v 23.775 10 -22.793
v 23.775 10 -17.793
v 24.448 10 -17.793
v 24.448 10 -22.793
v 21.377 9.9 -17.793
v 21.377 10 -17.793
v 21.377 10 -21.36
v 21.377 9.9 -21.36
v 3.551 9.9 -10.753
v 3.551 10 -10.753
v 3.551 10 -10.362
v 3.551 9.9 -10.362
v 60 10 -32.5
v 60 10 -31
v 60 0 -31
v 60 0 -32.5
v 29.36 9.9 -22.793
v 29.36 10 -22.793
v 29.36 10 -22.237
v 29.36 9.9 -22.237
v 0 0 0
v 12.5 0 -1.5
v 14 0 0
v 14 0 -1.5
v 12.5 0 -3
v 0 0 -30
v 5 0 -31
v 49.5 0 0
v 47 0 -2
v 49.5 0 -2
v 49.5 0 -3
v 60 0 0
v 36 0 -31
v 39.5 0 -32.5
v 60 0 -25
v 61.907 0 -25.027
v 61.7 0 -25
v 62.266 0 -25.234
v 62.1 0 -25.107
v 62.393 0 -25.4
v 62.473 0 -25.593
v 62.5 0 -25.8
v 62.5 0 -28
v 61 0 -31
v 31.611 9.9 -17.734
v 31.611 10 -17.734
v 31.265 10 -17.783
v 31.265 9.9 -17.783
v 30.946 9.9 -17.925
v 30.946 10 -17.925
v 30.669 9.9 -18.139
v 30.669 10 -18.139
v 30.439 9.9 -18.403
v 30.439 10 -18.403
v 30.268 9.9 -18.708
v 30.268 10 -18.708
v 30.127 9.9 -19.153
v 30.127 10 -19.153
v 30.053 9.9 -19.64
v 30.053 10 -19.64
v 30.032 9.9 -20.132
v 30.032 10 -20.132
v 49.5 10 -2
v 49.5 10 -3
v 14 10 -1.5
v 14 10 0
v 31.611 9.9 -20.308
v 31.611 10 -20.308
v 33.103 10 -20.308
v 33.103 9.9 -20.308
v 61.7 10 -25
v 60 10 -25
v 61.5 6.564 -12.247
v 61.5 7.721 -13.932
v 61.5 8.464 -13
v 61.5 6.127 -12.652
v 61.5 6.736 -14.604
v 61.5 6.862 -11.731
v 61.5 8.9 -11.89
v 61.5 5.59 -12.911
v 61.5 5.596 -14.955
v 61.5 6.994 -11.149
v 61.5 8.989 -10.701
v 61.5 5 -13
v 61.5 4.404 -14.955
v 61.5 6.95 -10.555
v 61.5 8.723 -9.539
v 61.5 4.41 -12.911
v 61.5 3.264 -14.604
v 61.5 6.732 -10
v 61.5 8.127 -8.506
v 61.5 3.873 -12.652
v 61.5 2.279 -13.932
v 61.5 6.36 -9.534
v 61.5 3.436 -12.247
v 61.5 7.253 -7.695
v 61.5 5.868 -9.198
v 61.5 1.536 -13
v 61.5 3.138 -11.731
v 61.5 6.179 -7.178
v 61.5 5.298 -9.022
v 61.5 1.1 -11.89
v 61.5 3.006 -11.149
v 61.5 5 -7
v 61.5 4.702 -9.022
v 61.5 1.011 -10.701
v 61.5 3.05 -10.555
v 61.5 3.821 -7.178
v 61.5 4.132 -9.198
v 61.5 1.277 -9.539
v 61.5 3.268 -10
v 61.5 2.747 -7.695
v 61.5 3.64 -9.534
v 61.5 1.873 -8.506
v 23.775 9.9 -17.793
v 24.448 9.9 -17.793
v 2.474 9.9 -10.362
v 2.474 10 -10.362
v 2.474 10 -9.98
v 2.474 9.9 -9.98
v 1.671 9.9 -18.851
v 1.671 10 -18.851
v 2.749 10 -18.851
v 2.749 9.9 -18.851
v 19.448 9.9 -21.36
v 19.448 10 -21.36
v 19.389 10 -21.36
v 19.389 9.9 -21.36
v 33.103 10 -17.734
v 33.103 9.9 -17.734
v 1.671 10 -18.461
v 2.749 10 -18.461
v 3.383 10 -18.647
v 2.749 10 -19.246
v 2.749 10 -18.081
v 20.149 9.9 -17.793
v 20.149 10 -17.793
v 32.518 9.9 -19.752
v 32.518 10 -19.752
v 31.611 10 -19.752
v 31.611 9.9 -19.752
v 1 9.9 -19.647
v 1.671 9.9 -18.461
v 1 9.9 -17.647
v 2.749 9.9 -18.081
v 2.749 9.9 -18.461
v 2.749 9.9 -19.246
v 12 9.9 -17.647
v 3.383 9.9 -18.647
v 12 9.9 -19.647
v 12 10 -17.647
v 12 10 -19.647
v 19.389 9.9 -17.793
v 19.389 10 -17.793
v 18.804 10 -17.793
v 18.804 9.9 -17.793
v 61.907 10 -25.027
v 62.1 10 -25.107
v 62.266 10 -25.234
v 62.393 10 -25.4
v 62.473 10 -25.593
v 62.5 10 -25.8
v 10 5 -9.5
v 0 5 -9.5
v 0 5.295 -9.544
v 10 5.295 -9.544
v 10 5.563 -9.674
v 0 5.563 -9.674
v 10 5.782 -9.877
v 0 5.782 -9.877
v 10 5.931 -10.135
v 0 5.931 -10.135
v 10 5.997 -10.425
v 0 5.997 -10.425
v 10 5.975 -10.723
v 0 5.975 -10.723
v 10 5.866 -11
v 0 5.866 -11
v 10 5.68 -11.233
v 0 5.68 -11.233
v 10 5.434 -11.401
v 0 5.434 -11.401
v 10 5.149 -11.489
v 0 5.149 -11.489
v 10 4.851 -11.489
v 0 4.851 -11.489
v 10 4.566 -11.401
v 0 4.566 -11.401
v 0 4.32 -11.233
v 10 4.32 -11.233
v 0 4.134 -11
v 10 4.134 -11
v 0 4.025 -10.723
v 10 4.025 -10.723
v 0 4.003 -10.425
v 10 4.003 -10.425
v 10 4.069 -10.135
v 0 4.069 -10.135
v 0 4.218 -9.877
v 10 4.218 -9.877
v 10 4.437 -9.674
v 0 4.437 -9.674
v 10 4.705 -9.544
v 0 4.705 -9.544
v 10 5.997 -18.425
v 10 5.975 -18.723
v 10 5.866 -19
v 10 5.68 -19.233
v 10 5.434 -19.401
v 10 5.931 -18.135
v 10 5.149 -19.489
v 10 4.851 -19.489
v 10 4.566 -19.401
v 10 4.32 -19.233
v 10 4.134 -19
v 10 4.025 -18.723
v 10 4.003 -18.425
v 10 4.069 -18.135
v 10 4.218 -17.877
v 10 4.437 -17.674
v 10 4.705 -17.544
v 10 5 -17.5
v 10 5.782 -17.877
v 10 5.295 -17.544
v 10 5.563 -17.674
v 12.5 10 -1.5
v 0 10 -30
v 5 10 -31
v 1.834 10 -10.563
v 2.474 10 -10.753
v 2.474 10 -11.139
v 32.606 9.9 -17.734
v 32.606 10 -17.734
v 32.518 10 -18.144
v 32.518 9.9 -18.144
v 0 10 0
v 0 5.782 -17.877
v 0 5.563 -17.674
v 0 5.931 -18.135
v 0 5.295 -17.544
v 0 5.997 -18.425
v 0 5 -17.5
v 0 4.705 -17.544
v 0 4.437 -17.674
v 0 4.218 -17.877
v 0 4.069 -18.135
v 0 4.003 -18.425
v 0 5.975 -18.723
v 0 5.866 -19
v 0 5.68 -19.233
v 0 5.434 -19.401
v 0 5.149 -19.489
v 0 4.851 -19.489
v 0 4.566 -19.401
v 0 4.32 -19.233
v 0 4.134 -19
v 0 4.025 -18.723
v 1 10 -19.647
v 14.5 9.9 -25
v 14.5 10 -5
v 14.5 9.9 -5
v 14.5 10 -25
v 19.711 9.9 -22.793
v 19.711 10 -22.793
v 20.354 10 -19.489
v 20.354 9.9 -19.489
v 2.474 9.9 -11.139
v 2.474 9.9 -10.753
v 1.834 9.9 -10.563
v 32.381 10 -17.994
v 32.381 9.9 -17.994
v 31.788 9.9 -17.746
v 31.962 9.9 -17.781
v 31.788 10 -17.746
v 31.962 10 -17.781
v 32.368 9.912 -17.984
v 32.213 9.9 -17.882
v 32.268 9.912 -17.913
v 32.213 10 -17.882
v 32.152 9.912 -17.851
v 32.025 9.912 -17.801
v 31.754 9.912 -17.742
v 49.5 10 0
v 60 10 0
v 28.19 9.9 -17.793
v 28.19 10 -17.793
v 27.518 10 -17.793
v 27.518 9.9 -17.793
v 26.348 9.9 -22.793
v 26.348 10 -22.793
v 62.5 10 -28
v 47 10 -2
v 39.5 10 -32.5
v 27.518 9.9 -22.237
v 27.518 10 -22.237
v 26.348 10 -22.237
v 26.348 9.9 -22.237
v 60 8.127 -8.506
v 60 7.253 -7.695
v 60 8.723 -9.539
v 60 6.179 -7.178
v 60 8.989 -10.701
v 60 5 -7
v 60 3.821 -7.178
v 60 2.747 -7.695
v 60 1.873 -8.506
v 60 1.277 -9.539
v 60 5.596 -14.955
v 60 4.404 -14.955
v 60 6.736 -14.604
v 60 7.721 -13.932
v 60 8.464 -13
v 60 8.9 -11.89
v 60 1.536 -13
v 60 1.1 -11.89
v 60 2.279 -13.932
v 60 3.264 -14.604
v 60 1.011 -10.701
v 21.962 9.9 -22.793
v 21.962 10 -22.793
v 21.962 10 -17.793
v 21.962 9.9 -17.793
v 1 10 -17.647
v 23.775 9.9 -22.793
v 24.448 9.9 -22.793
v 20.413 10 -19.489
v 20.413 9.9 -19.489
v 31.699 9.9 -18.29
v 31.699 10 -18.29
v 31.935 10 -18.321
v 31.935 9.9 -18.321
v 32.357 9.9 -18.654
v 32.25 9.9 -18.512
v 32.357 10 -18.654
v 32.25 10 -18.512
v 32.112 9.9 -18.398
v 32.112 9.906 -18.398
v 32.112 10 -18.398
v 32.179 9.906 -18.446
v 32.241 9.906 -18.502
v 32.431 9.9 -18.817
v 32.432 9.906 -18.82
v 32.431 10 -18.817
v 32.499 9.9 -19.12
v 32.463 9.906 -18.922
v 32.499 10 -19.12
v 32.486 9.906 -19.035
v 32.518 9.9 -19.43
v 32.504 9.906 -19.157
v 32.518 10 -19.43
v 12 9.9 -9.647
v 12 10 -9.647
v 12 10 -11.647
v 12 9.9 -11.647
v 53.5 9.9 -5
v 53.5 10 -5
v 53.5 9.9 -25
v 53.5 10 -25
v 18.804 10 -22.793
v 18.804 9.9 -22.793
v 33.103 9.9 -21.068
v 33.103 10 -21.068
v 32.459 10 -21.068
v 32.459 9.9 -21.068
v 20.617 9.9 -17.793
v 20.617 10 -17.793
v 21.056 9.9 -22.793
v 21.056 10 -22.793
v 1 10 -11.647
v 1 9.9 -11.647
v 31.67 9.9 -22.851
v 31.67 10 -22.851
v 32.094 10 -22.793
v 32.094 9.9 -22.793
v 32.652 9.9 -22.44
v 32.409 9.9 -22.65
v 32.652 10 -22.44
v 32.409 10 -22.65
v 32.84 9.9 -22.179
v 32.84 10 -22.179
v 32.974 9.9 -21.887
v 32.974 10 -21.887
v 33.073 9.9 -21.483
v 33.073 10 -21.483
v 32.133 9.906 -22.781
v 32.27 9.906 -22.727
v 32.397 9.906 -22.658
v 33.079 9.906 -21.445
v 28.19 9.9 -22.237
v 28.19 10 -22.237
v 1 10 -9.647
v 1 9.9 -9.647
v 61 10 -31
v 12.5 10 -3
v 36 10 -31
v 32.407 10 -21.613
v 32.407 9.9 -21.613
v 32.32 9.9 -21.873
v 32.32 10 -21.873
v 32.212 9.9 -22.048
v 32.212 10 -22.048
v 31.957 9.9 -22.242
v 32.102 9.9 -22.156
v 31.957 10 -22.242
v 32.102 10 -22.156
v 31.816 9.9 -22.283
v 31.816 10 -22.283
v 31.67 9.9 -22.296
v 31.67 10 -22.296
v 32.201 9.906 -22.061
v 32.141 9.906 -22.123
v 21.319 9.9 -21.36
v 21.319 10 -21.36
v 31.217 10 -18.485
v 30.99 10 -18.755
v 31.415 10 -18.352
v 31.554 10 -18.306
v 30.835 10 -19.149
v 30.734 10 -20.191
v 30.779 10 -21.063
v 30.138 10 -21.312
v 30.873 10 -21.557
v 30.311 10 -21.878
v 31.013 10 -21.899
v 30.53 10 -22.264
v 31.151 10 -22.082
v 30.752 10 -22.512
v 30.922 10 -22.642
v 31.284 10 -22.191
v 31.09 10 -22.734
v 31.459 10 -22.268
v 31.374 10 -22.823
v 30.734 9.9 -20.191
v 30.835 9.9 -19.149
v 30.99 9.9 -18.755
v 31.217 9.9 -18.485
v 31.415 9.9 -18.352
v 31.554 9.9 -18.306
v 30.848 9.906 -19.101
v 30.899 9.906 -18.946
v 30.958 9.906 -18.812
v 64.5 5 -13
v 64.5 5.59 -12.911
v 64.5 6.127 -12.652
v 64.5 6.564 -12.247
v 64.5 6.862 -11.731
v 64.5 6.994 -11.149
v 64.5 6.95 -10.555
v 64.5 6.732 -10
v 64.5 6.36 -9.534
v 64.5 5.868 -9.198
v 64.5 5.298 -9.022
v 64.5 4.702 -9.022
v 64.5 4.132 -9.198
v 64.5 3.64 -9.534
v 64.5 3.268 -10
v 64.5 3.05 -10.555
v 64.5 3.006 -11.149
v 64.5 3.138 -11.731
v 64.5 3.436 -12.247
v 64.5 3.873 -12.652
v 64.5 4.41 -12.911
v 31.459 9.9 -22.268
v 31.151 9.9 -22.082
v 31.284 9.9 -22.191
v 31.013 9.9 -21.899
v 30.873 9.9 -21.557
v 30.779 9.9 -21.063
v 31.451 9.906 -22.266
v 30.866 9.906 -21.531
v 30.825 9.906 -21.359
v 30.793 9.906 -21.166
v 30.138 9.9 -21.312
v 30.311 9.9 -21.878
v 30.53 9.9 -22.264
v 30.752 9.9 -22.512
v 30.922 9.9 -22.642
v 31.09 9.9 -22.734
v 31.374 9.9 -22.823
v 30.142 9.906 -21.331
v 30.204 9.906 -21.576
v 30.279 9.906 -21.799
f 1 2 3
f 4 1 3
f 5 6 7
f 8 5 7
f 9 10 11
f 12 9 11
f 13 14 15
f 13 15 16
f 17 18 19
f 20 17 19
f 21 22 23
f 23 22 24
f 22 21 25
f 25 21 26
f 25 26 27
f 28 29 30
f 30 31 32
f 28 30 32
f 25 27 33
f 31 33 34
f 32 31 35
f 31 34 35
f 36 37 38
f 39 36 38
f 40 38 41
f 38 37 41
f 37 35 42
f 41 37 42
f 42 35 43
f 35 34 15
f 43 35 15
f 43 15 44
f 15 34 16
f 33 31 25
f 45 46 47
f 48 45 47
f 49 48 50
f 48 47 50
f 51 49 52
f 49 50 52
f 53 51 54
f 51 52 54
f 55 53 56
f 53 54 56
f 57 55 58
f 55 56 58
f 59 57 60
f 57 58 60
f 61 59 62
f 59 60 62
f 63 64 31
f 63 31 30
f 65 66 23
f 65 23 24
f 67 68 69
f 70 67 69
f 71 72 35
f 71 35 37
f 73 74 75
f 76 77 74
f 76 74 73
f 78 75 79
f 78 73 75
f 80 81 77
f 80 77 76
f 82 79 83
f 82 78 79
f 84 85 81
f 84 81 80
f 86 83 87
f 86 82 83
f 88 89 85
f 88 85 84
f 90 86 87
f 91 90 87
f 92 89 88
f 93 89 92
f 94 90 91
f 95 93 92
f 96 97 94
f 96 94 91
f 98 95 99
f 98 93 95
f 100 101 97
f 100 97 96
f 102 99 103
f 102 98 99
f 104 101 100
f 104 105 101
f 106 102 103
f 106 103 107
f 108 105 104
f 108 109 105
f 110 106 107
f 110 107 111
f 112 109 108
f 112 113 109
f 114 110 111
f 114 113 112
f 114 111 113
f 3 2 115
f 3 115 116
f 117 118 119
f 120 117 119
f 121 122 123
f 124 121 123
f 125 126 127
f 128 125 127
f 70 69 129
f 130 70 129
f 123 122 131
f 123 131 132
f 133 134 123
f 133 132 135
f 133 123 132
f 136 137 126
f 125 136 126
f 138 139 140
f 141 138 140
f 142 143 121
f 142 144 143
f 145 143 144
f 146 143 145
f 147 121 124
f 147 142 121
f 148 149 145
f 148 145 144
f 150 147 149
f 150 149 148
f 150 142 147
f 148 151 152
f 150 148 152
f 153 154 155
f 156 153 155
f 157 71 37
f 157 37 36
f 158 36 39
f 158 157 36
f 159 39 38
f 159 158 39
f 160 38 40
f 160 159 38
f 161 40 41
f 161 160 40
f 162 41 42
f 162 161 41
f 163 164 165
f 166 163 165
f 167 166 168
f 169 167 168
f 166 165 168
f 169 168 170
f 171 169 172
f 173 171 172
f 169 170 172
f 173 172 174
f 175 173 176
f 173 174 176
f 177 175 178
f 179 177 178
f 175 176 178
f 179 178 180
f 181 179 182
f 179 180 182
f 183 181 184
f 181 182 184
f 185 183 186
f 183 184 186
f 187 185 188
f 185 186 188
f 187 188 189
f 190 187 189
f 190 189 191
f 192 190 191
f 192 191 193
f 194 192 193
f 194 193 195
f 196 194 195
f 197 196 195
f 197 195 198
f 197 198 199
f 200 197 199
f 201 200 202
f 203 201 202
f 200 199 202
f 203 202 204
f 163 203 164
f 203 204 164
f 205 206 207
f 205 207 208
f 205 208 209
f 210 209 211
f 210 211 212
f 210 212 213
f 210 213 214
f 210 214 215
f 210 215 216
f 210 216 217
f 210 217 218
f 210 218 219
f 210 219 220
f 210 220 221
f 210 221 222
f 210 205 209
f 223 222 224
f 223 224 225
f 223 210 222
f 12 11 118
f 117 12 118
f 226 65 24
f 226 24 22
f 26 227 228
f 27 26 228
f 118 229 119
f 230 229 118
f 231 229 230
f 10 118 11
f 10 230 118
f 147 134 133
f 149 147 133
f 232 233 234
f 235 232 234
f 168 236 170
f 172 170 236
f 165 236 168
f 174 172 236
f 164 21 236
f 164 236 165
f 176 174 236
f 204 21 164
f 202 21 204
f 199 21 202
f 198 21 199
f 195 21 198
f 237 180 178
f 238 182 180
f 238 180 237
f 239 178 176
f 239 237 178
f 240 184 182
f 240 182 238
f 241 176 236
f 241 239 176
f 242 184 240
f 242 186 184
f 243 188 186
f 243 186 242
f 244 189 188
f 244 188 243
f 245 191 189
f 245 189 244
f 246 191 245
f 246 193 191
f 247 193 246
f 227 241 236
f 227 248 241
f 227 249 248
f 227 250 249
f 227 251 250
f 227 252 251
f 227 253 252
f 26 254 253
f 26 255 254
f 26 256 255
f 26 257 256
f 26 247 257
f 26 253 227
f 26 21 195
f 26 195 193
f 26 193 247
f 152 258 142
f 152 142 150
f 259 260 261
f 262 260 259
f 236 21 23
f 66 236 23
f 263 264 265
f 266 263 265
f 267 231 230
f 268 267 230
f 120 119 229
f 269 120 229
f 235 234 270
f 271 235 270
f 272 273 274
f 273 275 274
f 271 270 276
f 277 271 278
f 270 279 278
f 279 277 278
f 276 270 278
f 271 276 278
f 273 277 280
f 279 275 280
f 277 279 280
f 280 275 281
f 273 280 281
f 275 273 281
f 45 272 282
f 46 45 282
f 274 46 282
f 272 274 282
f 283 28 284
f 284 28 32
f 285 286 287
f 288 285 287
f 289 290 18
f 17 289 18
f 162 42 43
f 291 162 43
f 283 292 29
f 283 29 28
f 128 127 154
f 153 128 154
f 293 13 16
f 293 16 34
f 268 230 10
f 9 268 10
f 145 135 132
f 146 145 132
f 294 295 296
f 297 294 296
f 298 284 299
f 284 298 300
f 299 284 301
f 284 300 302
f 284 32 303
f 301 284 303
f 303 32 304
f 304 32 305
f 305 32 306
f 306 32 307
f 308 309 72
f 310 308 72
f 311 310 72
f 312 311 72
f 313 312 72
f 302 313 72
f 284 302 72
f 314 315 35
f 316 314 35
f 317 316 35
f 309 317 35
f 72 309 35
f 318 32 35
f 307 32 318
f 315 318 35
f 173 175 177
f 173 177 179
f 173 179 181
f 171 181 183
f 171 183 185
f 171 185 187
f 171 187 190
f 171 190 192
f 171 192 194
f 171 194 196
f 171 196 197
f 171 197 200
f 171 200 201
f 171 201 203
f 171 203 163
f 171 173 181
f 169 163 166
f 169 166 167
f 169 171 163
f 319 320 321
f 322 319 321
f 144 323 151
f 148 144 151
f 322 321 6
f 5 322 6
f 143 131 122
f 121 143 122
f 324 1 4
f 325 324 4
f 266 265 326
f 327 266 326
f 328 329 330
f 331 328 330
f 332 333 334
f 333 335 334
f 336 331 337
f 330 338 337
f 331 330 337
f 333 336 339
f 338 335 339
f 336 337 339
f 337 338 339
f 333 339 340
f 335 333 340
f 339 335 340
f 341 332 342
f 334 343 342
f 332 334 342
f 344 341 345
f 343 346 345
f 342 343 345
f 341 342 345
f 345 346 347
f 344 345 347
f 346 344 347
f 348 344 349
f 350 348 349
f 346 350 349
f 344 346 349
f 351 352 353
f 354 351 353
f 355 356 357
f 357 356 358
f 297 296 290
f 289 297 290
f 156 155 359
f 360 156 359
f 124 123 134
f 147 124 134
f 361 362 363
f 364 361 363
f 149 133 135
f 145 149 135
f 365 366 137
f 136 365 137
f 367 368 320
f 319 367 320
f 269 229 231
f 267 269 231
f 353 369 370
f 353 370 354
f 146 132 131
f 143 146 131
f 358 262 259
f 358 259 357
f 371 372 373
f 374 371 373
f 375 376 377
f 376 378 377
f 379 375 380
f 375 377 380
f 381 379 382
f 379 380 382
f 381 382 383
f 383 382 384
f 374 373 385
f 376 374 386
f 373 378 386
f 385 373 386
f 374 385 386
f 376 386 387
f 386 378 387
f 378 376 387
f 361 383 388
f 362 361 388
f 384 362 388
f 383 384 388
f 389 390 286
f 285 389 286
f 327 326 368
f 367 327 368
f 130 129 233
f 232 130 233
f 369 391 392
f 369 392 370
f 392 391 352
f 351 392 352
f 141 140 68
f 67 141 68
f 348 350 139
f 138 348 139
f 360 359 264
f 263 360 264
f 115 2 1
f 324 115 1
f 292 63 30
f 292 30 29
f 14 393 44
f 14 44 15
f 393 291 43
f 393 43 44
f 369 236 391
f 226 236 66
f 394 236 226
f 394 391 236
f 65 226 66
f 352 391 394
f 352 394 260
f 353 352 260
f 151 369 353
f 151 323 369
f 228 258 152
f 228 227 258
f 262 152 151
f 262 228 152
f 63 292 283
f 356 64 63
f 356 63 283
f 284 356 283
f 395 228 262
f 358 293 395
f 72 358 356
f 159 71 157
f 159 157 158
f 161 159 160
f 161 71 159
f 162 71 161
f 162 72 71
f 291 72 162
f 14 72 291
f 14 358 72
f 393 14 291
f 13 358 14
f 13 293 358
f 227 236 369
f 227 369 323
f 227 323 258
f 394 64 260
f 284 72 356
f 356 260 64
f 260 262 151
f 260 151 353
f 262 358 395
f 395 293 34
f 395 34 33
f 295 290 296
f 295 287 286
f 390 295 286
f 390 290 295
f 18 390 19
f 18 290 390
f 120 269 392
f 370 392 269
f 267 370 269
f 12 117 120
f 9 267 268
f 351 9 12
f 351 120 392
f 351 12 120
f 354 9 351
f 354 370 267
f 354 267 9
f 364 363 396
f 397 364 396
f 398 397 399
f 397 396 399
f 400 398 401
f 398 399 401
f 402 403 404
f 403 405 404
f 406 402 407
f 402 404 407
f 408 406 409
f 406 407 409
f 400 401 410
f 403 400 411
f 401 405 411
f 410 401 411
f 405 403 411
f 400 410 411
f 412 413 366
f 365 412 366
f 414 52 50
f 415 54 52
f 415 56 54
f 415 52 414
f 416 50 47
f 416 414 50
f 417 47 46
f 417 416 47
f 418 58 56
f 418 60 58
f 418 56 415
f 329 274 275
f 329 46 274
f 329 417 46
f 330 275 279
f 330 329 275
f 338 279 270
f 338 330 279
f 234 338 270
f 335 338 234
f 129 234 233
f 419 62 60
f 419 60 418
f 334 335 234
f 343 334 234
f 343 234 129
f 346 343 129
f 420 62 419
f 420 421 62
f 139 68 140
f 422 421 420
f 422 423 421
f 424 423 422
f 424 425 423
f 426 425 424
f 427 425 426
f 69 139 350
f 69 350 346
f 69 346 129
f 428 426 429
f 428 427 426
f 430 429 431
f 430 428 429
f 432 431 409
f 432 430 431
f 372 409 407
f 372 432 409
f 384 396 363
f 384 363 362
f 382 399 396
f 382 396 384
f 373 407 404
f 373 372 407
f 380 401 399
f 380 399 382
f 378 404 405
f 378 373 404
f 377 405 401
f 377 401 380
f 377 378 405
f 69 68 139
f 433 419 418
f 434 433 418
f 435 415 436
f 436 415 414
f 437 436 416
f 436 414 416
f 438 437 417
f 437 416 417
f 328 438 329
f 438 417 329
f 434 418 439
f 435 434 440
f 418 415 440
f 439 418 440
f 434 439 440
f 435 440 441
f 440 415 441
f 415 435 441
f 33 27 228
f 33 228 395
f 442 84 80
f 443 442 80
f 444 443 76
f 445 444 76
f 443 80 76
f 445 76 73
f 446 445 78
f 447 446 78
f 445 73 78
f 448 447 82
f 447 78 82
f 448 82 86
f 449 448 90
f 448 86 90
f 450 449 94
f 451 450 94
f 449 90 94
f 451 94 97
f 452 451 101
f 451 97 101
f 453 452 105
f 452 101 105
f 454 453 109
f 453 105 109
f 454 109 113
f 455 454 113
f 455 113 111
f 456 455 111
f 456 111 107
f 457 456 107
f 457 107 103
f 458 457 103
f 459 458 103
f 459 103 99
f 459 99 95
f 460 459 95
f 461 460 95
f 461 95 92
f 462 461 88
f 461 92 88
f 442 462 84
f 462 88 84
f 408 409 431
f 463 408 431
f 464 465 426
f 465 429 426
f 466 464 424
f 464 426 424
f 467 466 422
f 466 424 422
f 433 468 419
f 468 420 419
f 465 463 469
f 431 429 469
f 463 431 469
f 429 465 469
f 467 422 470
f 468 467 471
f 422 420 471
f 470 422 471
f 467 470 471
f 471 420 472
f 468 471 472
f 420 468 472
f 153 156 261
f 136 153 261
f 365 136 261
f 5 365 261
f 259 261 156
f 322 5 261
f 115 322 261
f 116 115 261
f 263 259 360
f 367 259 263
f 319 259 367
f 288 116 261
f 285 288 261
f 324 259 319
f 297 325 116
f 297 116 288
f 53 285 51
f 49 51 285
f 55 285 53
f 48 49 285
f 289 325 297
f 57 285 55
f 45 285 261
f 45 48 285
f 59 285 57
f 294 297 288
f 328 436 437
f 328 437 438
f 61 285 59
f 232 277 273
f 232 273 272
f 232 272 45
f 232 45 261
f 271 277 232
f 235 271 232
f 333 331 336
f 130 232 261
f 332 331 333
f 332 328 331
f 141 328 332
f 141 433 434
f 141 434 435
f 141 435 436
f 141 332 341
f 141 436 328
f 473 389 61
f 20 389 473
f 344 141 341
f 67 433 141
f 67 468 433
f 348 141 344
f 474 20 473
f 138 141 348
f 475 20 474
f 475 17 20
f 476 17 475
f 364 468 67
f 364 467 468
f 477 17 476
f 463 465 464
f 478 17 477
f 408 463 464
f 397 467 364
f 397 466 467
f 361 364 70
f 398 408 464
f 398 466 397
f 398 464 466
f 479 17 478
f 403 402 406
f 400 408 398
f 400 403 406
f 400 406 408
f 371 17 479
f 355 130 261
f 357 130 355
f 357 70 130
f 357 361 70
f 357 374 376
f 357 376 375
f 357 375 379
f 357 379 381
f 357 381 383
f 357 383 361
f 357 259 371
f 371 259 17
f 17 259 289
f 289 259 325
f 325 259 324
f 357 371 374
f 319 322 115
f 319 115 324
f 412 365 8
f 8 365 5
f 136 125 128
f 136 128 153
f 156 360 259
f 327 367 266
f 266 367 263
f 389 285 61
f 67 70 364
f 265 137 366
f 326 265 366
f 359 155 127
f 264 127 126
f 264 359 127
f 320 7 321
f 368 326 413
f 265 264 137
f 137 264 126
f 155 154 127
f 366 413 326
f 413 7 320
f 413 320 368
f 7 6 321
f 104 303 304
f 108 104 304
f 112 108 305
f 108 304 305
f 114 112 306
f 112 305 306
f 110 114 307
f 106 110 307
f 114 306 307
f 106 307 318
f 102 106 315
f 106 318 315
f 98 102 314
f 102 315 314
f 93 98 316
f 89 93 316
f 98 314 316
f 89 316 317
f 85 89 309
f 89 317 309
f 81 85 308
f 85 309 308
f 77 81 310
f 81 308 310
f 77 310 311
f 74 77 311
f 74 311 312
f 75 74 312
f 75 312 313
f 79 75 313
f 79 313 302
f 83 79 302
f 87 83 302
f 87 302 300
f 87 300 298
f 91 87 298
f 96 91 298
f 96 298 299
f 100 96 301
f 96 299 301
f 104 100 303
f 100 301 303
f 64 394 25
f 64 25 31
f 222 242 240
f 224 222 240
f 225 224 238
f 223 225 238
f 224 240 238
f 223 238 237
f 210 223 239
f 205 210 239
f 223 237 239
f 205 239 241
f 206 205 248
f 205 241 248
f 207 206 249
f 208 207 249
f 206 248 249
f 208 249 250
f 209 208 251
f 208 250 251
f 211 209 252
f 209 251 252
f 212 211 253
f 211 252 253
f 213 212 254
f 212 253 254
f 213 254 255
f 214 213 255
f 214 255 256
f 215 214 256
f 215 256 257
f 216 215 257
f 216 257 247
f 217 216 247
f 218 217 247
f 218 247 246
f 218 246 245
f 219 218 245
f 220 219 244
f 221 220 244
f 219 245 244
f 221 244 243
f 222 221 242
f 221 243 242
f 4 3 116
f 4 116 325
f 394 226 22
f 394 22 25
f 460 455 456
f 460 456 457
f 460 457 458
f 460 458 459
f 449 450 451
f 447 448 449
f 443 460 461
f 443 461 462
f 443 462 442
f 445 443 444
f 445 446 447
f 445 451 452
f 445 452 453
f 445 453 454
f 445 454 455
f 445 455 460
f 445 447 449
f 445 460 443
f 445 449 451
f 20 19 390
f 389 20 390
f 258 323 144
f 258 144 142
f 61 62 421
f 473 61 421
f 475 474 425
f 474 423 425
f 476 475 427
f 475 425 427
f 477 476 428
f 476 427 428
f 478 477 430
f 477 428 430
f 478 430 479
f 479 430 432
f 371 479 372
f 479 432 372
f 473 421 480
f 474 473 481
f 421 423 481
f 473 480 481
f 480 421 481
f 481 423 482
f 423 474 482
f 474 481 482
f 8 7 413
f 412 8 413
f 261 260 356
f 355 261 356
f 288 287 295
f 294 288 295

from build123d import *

# Parameters (mm, degrees)
SKETCH_1_W          = 60
SKETCH_1_H          = 31
EXTRUDE_1_DEPTH     = 10
CUT_EXTRUDE_1_DEPTH = 10
EXTRUDE_2_DEPTH     = 10
SKETCH_4_R          = 1
CUT_EXTRUDE_2_DEPTH = 10
SKETCH_5_W          = 39
SKETCH_5_H          = 20
SKETCH_5_W_2        = 0.67251462
SKETCH_5_H_2        = 5
SKETCH_5_W_3        = 11
SKETCH_5_H_3        = 2
CUT_EXTRUDE_3_DEPTH = 0.1
SKETCH_6_R          = 4
EXTRUDE_3_DEPTH     = 1.5
SKETCH_7_R          = 2
EXTRUDE_4_DEPTH     = 3


with BuildPart() as part:
    # 草图1 → 凸台-拉伸1 (new body)
    with BuildSketch(Plane(origin=(0, 0, 0), x_dir=(1, 0, 0), z_dir=(0, 1, 0))):
        with Locations((30, 15.5)):
            Rectangle(SKETCH_1_W, SKETCH_1_H)
    extrude(amount=EXTRUDE_1_DEPTH)

    # 草图2 → 切除-拉伸1 (cut)
    with BuildSketch(Plane(origin=(0, 10, 0), x_dir=(1, 0, 0), z_dir=(0, 1, 0))):
        Polygon((14, 0), (14, 1.5), (12.5, 1.5), (12.5, 3), (49.5, 3), (49.5, 2), (47, 2), (49.5, 0), align=None)
        Polygon((0, 30), (5, 31), (0, 31), align=None)
    extrude(amount=-CUT_EXTRUDE_1_DEPTH, mode=Mode.SUBTRACT)

    # 草图3 → 凸台-拉伸2 (add, through all)
    with BuildSketch(Plane(origin=(0, 10, 0), x_dir=(1, 0, 0), z_dir=(0, 1, 0))):
        with BuildLine():
            Line((61, 31), (60, 31))
            Line((60, 31), (60, 25))
            Line((60, 25), (61.7, 25))
            ThreePointArc((61.7, 25), (62.265685425, 25.234314575), (62.5, 25.8))
            Line((62.5, 25.8), (62.5, 28))
            Line((62.5, 28), (61, 31))
        make_face()
        Polygon((36, 31), (60, 31), (60, 32.5), (39.5, 32.5), align=None)
    extrude(amount=-EXTRUDE_2_DEPTH)

    # 草图4 → 切除-拉伸2 (cut)
    with BuildSketch(Plane.ZY):
        with Locations((-18.5, 5)):
            Circle(SKETCH_4_R)
        with Locations((-10.5, 5)):
            Circle(SKETCH_4_R)
    extrude(amount=-CUT_EXTRUDE_2_DEPTH, mode=Mode.SUBTRACT)

    # 草图5 → 切除-拉伸3 (cut)
    # profile 1 of 3: a face of its own
    with BuildSketch(Plane(origin=(0, 10, 0), x_dir=(1, 0, 0), z_dir=(0, 1, 0))):
        with Locations((34, 15)):
            Rectangle(SKETCH_5_W, SKETCH_5_H)
        Polygon((21.962260416, 17.792968637), (21.377465095, 17.792968637), (21.377465095, 21.360220099), (21.318985562, 21.360220099), (20.617231176, 17.792968637), (20.149394919, 17.792968637), (19.447640533, 21.360220099), (19.389161001, 21.360220099), (19.389161001, 17.792968637), (18.804365679, 17.792968637), (18.804365679, 22.792968637), (19.710798428, 22.792968637), (20.354073282, 19.48887507), (20.412552814, 19.48887507), (21.055827668, 22.792968637), (21.962260416, 22.792968637), align=None, mode=Mode.SUBTRACT)
        with Locations((24.111383223, 20.292968637)):
            Rectangle(SKETCH_5_W_2, SKETCH_5_H_2, mode=Mode.SUBTRACT)
        Polygon((29.359921235, 22.237413081), (28.190330592, 22.237413081), (28.190330592, 17.792968637), (27.517815972, 17.792968637), (27.517815972, 22.237413081), (26.348225329, 22.237413081), (26.348225329, 22.792968637), (29.359921235, 22.792968637), align=None, mode=Mode.SUBTRACT)
        with BuildLine():
            Line((33.102611293, 17.734489105), (32.60553527, 17.734489105))
            Line((32.60553527, 17.734489105), (32.517815972, 18.14384583))
            add(Edge.make_bspline(
                [(32.517815972, 18.14384583), (32.496335049, 18.114894908), (32.452578683, 18.05592225), (32.366892397, 17.979393037), (32.266643174, 17.909470256), (32.151128708, 17.848642528), (32.025699097, 17.798099411), (31.892521927, 17.760859691), (31.75360842, 17.739070297), (31.659108429, 17.736026374), (31.611383223, 17.734489105)],
                knots=[0, 0, 0, 0, 0.837184115, 1.705333332, 2.658671207, 3.677307666, 4.736711015, 5.80083511, 6.889358663, 8, 8, 8, 8], degree=3))
            add(Edge.make_bspline(
                [(31.611383223, 17.734489105), (31.560714868, 17.736021013), (31.46008263, 17.739063531), (31.311817937, 17.76762581), (31.16729555, 17.811965229), (31.027834691, 17.8755244), (30.891473719, 17.955281193), (30.760771836, 18.055054478), (30.632955326, 18.171046345), (30.509527994, 18.304333327), (30.396774962, 18.45853747), (30.297519239, 18.634098702), (30.215913122, 18.832381023), (30.147881926, 19.050856514), (30.096694353, 19.291330684), (30.05919444, 19.552513083), (30.036438806, 19.835379254), (30.033799786, 20.03103084), (30.032435855, 20.132149923)],
                knots=[0, 0, 0, 0, 0.758179789, 1.505818141, 2.253143624, 3.017869083, 3.795858856, 4.614441485, 5.475677495, 6.378750386, 7.330399785, 8.330312341, 9.391702904, 10.535751225, 11.753218739, 13.069914954, 14.485637047, 16, 16, 16, 16], degree=3))
            add(Edge.make_bspline(
                [(30.032435855, 20.132149923), (30.033524015, 20.243005064), (30.035631477, 20.457700531), (30.056303392, 20.768942629), (30.090571093, 21.058155718), (30.137547246, 21.32565553), (30.198737704, 21.571304744), (30.274571201, 21.795097166), (30.362412052, 21.997908599), (30.466184437, 22.177806713), (30.5809145, 22.336396595), (30.705728208, 22.474833232), (30.84257532, 22.589830475), (30.987256047, 22.687082934), (31.14384738, 22.76138369), (31.310614479, 22.812780351), (31.487019509, 22.845452192), (31.607987718, 22.849419101), (31.669862755, 22.851448169)],
                knots=[0, 0, 0, 0, 1.495213205, 2.895810661, 4.205263949, 5.422164245, 6.557127206, 7.616570214, 8.606403325, 9.533523062, 10.412081511, 11.242765381, 12.040838916, 12.817408929, 13.588463244, 14.369296309, 15.165897781, 16, 16, 16, 16], degree=3))
            add(Edge.make_bspline(
                [(31.669862755, 22.851448169), (31.724465447, 22.850157263), (31.831330219, 22.847630786), (31.986728106, 22.823055348), (32.133156944, 22.78417248), (32.270367528, 22.72996005), (32.39858198, 22.660001985), (32.517012997, 22.573895908), (32.626334766, 22.471986726), (32.725227795, 22.355220127), (32.813311094, 22.226144327), (32.892302084, 22.088427367), (32.956880517, 21.940329471), (33.009859712, 21.783333409), (33.052602879, 21.617693101), (33.080734277, 21.442188631), (33.100302009, 21.258143875), (33.101830982, 21.132132363), (33.102611293, 21.067822438)],
                knots=[0, 0, 0, 0, 1.017118894, 1.990637724, 2.924249984, 3.836374462, 4.733711419, 5.639510097, 6.558385009, 7.513001497, 8.485403533, 9.467718841, 10.467915617, 11.491402174, 12.553806325, 13.652248568, 14.801825996, 16, 16, 16, 16], degree=3))
            Line((33.102611293, 21.067822438), (32.45933644, 21.067822438))
            add(Edge.make_bspline(
                [(32.45933644, 21.067822438), (32.458729978, 21.117290953), (32.457551218, 21.213441346), (32.448009389, 21.352666796), (32.431312149, 21.482310098), (32.410867073, 21.602817265), (32.380914637, 21.71323506), (32.347227761, 21.814971363), (32.304498884, 21.905966508), (32.256760295, 21.988236327), (32.203036922, 22.060957155), (32.142500003, 22.123391188), (32.077558088, 22.176617179), (32.007055999, 22.22128447), (31.930094878, 22.254334745), (31.84783057, 22.277999378), (31.760739913, 22.29416845), (31.700622449, 22.295309026), (31.669862755, 22.295892614)],
                knots=[0, 0, 0, 0, 1.442265648, 2.803286258, 4.065667754, 5.252751118, 6.363271917, 7.39841691, 8.373155808, 9.288343585, 10.168233039, 11.001900497, 11.817228588, 12.611567034, 13.426963055, 14.24959516, 15.104388078, 16, 16, 16, 16], degree=3))
            add(Edge.make_bspline(
                [(31.669862755, 22.295892614), (31.631828893, 22.294563094), (31.557924625, 22.291979681), (31.450633434, 22.268061012), (31.350844775, 22.23047274), (31.257857421, 22.177333742), (31.172866818, 22.108722655), (31.097286108, 22.023210173), (31.025577535, 21.925676313), (30.964584262, 21.809804655), (30.908423102, 21.678016537), (30.863297772, 21.525387026), (30.821490016, 21.353610633), (30.790614597, 21.160102718), (30.763920798, 20.947080428), (30.748343708, 20.713136474), (30.735099548, 20.458990692), (30.734500993, 20.282340978), (30.734190241, 20.190629456)],
                knots=[0, 0, 0, 0, 0.713867664, 1.387128832, 2.054865043, 2.71116651, 3.391329963, 4.097256694, 4.850367561, 5.660840087, 6.551597142, 7.538616976, 8.647598492, 9.872123473, 11.218389466, 12.680914074, 14.276824714, 16, 16, 16, 16], degree=3))
            add(Edge.make_bspline(
                [(30.734190241, 20.190629456), (30.73483395, 20.103968299), (30.736071349, 19.937379816), (30.750607233, 19.698223249), (30.772176165, 19.47971091), (30.805076542, 19.282835127), (30.843512642, 19.105844287), (30.894744195, 18.950545195), (30.953134814, 18.815066175), (31.022715541, 18.70062504), (31.098039155, 18.604304965), (31.175512101, 18.520836306), (31.255451263, 18.450044406), (31.338684162, 18.392015675), (31.424300922, 18.345320992), (31.514153456, 18.314560623), (31.605733113, 18.293658802), (31.667942985, 18.291250783), (31.699102521, 18.29004466)],
                knots=[0, 0, 0, 0, 1.763137318, 3.38927359, 4.873732177, 6.228632264, 7.449226689, 8.554896297, 9.551299921, 10.444451664, 11.27164773, 12.035603122, 12.759076972, 13.439665674, 14.096862192, 14.735741838, 15.366761318, 16, 16, 16, 16], degree=3))
            add(Edge.make_bspline(
                [(31.699102521, 18.29004466), (31.72983218, 18.290848844), (31.790132284, 18.292426876), (31.878031693, 18.305615952), (31.961197096, 18.327367151), (32.039477559, 18.357607005), (32.112590811, 18.396886673), (32.180290182, 18.444875026), (32.24233728, 18.502053953), (32.300237525, 18.567322721), (32.352177249, 18.64200929), (32.396916088, 18.726819825), (32.434506327, 18.820857568), (32.464574283, 18.924703583), (32.488267476, 19.037669605), (32.505105864, 19.159978961), (32.516471005, 19.291925027), (32.517356401, 19.383080592), (32.517815972, 19.430395538)],
                knots=[0, 0, 0, 0, 0.926763241, 1.818566216, 2.674466499, 3.515830513, 4.344194496, 5.172200422, 6.012506428, 6.88440238, 7.799833367, 8.749917039, 9.771239203, 10.849892544, 12.007626437, 13.250589984, 14.572899121, 16, 16, 16, 16], degree=3))
            Line((32.517815972, 19.430395538), (32.517815972, 19.752032964))
            Line((32.517815972, 19.752032964), (31.611383223, 19.752032964))
            Line((31.611383223, 19.752032964), (31.611383223, 20.30758852))
            Line((31.611383223, 20.30758852), (33.102611293, 20.30758852))
            Line((33.102611293, 20.30758852), (33.102611293, 17.734489105))
        make_face(mode=Mode.SUBTRACT)
    # profile 2 of 3: a face of its own
    with BuildSketch(Plane(origin=(0, 10, 0), x_dir=(1, 0, 0), z_dir=(0, 1, 0))):
        with Locations((6.5, 18.646769807)):
            Rectangle(SKETCH_5_W_3, SKETCH_5_H_3)
        Polygon((3.383335667, 18.64715665), (2.749062348, 18.08056229), (2.749062348, 18.460605674), (1.671405081, 18.460605674), (1.671405081, 18.851495045), (2.749062348, 18.851495045), (2.749062348, 19.245855132), align=None, mode=Mode.SUBTRACT)
    # profile 3 of 3: a face of its own
    with BuildSketch(Plane(origin=(0, 10, 0), x_dir=(1, 0, 0), z_dir=(0, 1, 0))):
        with Locations((6.5, 10.646769807)):
            Rectangle(SKETCH_5_W_3, SKETCH_5_H_3)
        Polygon((3.551150659, 10.362171108), (2.473927231, 10.362171108), (2.473927231, 9.979524687), (1.834013999, 10.563038787), (2.473927231, 11.138743776), (2.473927231, 10.753060479), (3.551150659, 10.753060479), align=None, mode=Mode.SUBTRACT)
    extrude(amount=-CUT_EXTRUDE_3_DEPTH, mode=Mode.SUBTRACT)

    # 草图6 → 凸台-拉伸3 (add)
    with BuildSketch(Plane(origin=(60, 0, 0), x_dir=(0, 0, -1), z_dir=(1, 0, 0))):
        with Locations(Location((11, 5, 0), (0, 0, 180))):
            Circle(SKETCH_6_R)
    extrude(amount=EXTRUDE_3_DEPTH)

    # 草图7 → 凸台-拉伸4 (add)
    with BuildSketch(Plane(origin=(61.5, 0, 0), x_dir=(0, 0, -1), z_dir=(1, 0, 0))):
        with Locations((11, 5)):
            Circle(SKETCH_7_R)
    extrude(amount=EXTRUDE_4_DEPTH)


solid = part.part
